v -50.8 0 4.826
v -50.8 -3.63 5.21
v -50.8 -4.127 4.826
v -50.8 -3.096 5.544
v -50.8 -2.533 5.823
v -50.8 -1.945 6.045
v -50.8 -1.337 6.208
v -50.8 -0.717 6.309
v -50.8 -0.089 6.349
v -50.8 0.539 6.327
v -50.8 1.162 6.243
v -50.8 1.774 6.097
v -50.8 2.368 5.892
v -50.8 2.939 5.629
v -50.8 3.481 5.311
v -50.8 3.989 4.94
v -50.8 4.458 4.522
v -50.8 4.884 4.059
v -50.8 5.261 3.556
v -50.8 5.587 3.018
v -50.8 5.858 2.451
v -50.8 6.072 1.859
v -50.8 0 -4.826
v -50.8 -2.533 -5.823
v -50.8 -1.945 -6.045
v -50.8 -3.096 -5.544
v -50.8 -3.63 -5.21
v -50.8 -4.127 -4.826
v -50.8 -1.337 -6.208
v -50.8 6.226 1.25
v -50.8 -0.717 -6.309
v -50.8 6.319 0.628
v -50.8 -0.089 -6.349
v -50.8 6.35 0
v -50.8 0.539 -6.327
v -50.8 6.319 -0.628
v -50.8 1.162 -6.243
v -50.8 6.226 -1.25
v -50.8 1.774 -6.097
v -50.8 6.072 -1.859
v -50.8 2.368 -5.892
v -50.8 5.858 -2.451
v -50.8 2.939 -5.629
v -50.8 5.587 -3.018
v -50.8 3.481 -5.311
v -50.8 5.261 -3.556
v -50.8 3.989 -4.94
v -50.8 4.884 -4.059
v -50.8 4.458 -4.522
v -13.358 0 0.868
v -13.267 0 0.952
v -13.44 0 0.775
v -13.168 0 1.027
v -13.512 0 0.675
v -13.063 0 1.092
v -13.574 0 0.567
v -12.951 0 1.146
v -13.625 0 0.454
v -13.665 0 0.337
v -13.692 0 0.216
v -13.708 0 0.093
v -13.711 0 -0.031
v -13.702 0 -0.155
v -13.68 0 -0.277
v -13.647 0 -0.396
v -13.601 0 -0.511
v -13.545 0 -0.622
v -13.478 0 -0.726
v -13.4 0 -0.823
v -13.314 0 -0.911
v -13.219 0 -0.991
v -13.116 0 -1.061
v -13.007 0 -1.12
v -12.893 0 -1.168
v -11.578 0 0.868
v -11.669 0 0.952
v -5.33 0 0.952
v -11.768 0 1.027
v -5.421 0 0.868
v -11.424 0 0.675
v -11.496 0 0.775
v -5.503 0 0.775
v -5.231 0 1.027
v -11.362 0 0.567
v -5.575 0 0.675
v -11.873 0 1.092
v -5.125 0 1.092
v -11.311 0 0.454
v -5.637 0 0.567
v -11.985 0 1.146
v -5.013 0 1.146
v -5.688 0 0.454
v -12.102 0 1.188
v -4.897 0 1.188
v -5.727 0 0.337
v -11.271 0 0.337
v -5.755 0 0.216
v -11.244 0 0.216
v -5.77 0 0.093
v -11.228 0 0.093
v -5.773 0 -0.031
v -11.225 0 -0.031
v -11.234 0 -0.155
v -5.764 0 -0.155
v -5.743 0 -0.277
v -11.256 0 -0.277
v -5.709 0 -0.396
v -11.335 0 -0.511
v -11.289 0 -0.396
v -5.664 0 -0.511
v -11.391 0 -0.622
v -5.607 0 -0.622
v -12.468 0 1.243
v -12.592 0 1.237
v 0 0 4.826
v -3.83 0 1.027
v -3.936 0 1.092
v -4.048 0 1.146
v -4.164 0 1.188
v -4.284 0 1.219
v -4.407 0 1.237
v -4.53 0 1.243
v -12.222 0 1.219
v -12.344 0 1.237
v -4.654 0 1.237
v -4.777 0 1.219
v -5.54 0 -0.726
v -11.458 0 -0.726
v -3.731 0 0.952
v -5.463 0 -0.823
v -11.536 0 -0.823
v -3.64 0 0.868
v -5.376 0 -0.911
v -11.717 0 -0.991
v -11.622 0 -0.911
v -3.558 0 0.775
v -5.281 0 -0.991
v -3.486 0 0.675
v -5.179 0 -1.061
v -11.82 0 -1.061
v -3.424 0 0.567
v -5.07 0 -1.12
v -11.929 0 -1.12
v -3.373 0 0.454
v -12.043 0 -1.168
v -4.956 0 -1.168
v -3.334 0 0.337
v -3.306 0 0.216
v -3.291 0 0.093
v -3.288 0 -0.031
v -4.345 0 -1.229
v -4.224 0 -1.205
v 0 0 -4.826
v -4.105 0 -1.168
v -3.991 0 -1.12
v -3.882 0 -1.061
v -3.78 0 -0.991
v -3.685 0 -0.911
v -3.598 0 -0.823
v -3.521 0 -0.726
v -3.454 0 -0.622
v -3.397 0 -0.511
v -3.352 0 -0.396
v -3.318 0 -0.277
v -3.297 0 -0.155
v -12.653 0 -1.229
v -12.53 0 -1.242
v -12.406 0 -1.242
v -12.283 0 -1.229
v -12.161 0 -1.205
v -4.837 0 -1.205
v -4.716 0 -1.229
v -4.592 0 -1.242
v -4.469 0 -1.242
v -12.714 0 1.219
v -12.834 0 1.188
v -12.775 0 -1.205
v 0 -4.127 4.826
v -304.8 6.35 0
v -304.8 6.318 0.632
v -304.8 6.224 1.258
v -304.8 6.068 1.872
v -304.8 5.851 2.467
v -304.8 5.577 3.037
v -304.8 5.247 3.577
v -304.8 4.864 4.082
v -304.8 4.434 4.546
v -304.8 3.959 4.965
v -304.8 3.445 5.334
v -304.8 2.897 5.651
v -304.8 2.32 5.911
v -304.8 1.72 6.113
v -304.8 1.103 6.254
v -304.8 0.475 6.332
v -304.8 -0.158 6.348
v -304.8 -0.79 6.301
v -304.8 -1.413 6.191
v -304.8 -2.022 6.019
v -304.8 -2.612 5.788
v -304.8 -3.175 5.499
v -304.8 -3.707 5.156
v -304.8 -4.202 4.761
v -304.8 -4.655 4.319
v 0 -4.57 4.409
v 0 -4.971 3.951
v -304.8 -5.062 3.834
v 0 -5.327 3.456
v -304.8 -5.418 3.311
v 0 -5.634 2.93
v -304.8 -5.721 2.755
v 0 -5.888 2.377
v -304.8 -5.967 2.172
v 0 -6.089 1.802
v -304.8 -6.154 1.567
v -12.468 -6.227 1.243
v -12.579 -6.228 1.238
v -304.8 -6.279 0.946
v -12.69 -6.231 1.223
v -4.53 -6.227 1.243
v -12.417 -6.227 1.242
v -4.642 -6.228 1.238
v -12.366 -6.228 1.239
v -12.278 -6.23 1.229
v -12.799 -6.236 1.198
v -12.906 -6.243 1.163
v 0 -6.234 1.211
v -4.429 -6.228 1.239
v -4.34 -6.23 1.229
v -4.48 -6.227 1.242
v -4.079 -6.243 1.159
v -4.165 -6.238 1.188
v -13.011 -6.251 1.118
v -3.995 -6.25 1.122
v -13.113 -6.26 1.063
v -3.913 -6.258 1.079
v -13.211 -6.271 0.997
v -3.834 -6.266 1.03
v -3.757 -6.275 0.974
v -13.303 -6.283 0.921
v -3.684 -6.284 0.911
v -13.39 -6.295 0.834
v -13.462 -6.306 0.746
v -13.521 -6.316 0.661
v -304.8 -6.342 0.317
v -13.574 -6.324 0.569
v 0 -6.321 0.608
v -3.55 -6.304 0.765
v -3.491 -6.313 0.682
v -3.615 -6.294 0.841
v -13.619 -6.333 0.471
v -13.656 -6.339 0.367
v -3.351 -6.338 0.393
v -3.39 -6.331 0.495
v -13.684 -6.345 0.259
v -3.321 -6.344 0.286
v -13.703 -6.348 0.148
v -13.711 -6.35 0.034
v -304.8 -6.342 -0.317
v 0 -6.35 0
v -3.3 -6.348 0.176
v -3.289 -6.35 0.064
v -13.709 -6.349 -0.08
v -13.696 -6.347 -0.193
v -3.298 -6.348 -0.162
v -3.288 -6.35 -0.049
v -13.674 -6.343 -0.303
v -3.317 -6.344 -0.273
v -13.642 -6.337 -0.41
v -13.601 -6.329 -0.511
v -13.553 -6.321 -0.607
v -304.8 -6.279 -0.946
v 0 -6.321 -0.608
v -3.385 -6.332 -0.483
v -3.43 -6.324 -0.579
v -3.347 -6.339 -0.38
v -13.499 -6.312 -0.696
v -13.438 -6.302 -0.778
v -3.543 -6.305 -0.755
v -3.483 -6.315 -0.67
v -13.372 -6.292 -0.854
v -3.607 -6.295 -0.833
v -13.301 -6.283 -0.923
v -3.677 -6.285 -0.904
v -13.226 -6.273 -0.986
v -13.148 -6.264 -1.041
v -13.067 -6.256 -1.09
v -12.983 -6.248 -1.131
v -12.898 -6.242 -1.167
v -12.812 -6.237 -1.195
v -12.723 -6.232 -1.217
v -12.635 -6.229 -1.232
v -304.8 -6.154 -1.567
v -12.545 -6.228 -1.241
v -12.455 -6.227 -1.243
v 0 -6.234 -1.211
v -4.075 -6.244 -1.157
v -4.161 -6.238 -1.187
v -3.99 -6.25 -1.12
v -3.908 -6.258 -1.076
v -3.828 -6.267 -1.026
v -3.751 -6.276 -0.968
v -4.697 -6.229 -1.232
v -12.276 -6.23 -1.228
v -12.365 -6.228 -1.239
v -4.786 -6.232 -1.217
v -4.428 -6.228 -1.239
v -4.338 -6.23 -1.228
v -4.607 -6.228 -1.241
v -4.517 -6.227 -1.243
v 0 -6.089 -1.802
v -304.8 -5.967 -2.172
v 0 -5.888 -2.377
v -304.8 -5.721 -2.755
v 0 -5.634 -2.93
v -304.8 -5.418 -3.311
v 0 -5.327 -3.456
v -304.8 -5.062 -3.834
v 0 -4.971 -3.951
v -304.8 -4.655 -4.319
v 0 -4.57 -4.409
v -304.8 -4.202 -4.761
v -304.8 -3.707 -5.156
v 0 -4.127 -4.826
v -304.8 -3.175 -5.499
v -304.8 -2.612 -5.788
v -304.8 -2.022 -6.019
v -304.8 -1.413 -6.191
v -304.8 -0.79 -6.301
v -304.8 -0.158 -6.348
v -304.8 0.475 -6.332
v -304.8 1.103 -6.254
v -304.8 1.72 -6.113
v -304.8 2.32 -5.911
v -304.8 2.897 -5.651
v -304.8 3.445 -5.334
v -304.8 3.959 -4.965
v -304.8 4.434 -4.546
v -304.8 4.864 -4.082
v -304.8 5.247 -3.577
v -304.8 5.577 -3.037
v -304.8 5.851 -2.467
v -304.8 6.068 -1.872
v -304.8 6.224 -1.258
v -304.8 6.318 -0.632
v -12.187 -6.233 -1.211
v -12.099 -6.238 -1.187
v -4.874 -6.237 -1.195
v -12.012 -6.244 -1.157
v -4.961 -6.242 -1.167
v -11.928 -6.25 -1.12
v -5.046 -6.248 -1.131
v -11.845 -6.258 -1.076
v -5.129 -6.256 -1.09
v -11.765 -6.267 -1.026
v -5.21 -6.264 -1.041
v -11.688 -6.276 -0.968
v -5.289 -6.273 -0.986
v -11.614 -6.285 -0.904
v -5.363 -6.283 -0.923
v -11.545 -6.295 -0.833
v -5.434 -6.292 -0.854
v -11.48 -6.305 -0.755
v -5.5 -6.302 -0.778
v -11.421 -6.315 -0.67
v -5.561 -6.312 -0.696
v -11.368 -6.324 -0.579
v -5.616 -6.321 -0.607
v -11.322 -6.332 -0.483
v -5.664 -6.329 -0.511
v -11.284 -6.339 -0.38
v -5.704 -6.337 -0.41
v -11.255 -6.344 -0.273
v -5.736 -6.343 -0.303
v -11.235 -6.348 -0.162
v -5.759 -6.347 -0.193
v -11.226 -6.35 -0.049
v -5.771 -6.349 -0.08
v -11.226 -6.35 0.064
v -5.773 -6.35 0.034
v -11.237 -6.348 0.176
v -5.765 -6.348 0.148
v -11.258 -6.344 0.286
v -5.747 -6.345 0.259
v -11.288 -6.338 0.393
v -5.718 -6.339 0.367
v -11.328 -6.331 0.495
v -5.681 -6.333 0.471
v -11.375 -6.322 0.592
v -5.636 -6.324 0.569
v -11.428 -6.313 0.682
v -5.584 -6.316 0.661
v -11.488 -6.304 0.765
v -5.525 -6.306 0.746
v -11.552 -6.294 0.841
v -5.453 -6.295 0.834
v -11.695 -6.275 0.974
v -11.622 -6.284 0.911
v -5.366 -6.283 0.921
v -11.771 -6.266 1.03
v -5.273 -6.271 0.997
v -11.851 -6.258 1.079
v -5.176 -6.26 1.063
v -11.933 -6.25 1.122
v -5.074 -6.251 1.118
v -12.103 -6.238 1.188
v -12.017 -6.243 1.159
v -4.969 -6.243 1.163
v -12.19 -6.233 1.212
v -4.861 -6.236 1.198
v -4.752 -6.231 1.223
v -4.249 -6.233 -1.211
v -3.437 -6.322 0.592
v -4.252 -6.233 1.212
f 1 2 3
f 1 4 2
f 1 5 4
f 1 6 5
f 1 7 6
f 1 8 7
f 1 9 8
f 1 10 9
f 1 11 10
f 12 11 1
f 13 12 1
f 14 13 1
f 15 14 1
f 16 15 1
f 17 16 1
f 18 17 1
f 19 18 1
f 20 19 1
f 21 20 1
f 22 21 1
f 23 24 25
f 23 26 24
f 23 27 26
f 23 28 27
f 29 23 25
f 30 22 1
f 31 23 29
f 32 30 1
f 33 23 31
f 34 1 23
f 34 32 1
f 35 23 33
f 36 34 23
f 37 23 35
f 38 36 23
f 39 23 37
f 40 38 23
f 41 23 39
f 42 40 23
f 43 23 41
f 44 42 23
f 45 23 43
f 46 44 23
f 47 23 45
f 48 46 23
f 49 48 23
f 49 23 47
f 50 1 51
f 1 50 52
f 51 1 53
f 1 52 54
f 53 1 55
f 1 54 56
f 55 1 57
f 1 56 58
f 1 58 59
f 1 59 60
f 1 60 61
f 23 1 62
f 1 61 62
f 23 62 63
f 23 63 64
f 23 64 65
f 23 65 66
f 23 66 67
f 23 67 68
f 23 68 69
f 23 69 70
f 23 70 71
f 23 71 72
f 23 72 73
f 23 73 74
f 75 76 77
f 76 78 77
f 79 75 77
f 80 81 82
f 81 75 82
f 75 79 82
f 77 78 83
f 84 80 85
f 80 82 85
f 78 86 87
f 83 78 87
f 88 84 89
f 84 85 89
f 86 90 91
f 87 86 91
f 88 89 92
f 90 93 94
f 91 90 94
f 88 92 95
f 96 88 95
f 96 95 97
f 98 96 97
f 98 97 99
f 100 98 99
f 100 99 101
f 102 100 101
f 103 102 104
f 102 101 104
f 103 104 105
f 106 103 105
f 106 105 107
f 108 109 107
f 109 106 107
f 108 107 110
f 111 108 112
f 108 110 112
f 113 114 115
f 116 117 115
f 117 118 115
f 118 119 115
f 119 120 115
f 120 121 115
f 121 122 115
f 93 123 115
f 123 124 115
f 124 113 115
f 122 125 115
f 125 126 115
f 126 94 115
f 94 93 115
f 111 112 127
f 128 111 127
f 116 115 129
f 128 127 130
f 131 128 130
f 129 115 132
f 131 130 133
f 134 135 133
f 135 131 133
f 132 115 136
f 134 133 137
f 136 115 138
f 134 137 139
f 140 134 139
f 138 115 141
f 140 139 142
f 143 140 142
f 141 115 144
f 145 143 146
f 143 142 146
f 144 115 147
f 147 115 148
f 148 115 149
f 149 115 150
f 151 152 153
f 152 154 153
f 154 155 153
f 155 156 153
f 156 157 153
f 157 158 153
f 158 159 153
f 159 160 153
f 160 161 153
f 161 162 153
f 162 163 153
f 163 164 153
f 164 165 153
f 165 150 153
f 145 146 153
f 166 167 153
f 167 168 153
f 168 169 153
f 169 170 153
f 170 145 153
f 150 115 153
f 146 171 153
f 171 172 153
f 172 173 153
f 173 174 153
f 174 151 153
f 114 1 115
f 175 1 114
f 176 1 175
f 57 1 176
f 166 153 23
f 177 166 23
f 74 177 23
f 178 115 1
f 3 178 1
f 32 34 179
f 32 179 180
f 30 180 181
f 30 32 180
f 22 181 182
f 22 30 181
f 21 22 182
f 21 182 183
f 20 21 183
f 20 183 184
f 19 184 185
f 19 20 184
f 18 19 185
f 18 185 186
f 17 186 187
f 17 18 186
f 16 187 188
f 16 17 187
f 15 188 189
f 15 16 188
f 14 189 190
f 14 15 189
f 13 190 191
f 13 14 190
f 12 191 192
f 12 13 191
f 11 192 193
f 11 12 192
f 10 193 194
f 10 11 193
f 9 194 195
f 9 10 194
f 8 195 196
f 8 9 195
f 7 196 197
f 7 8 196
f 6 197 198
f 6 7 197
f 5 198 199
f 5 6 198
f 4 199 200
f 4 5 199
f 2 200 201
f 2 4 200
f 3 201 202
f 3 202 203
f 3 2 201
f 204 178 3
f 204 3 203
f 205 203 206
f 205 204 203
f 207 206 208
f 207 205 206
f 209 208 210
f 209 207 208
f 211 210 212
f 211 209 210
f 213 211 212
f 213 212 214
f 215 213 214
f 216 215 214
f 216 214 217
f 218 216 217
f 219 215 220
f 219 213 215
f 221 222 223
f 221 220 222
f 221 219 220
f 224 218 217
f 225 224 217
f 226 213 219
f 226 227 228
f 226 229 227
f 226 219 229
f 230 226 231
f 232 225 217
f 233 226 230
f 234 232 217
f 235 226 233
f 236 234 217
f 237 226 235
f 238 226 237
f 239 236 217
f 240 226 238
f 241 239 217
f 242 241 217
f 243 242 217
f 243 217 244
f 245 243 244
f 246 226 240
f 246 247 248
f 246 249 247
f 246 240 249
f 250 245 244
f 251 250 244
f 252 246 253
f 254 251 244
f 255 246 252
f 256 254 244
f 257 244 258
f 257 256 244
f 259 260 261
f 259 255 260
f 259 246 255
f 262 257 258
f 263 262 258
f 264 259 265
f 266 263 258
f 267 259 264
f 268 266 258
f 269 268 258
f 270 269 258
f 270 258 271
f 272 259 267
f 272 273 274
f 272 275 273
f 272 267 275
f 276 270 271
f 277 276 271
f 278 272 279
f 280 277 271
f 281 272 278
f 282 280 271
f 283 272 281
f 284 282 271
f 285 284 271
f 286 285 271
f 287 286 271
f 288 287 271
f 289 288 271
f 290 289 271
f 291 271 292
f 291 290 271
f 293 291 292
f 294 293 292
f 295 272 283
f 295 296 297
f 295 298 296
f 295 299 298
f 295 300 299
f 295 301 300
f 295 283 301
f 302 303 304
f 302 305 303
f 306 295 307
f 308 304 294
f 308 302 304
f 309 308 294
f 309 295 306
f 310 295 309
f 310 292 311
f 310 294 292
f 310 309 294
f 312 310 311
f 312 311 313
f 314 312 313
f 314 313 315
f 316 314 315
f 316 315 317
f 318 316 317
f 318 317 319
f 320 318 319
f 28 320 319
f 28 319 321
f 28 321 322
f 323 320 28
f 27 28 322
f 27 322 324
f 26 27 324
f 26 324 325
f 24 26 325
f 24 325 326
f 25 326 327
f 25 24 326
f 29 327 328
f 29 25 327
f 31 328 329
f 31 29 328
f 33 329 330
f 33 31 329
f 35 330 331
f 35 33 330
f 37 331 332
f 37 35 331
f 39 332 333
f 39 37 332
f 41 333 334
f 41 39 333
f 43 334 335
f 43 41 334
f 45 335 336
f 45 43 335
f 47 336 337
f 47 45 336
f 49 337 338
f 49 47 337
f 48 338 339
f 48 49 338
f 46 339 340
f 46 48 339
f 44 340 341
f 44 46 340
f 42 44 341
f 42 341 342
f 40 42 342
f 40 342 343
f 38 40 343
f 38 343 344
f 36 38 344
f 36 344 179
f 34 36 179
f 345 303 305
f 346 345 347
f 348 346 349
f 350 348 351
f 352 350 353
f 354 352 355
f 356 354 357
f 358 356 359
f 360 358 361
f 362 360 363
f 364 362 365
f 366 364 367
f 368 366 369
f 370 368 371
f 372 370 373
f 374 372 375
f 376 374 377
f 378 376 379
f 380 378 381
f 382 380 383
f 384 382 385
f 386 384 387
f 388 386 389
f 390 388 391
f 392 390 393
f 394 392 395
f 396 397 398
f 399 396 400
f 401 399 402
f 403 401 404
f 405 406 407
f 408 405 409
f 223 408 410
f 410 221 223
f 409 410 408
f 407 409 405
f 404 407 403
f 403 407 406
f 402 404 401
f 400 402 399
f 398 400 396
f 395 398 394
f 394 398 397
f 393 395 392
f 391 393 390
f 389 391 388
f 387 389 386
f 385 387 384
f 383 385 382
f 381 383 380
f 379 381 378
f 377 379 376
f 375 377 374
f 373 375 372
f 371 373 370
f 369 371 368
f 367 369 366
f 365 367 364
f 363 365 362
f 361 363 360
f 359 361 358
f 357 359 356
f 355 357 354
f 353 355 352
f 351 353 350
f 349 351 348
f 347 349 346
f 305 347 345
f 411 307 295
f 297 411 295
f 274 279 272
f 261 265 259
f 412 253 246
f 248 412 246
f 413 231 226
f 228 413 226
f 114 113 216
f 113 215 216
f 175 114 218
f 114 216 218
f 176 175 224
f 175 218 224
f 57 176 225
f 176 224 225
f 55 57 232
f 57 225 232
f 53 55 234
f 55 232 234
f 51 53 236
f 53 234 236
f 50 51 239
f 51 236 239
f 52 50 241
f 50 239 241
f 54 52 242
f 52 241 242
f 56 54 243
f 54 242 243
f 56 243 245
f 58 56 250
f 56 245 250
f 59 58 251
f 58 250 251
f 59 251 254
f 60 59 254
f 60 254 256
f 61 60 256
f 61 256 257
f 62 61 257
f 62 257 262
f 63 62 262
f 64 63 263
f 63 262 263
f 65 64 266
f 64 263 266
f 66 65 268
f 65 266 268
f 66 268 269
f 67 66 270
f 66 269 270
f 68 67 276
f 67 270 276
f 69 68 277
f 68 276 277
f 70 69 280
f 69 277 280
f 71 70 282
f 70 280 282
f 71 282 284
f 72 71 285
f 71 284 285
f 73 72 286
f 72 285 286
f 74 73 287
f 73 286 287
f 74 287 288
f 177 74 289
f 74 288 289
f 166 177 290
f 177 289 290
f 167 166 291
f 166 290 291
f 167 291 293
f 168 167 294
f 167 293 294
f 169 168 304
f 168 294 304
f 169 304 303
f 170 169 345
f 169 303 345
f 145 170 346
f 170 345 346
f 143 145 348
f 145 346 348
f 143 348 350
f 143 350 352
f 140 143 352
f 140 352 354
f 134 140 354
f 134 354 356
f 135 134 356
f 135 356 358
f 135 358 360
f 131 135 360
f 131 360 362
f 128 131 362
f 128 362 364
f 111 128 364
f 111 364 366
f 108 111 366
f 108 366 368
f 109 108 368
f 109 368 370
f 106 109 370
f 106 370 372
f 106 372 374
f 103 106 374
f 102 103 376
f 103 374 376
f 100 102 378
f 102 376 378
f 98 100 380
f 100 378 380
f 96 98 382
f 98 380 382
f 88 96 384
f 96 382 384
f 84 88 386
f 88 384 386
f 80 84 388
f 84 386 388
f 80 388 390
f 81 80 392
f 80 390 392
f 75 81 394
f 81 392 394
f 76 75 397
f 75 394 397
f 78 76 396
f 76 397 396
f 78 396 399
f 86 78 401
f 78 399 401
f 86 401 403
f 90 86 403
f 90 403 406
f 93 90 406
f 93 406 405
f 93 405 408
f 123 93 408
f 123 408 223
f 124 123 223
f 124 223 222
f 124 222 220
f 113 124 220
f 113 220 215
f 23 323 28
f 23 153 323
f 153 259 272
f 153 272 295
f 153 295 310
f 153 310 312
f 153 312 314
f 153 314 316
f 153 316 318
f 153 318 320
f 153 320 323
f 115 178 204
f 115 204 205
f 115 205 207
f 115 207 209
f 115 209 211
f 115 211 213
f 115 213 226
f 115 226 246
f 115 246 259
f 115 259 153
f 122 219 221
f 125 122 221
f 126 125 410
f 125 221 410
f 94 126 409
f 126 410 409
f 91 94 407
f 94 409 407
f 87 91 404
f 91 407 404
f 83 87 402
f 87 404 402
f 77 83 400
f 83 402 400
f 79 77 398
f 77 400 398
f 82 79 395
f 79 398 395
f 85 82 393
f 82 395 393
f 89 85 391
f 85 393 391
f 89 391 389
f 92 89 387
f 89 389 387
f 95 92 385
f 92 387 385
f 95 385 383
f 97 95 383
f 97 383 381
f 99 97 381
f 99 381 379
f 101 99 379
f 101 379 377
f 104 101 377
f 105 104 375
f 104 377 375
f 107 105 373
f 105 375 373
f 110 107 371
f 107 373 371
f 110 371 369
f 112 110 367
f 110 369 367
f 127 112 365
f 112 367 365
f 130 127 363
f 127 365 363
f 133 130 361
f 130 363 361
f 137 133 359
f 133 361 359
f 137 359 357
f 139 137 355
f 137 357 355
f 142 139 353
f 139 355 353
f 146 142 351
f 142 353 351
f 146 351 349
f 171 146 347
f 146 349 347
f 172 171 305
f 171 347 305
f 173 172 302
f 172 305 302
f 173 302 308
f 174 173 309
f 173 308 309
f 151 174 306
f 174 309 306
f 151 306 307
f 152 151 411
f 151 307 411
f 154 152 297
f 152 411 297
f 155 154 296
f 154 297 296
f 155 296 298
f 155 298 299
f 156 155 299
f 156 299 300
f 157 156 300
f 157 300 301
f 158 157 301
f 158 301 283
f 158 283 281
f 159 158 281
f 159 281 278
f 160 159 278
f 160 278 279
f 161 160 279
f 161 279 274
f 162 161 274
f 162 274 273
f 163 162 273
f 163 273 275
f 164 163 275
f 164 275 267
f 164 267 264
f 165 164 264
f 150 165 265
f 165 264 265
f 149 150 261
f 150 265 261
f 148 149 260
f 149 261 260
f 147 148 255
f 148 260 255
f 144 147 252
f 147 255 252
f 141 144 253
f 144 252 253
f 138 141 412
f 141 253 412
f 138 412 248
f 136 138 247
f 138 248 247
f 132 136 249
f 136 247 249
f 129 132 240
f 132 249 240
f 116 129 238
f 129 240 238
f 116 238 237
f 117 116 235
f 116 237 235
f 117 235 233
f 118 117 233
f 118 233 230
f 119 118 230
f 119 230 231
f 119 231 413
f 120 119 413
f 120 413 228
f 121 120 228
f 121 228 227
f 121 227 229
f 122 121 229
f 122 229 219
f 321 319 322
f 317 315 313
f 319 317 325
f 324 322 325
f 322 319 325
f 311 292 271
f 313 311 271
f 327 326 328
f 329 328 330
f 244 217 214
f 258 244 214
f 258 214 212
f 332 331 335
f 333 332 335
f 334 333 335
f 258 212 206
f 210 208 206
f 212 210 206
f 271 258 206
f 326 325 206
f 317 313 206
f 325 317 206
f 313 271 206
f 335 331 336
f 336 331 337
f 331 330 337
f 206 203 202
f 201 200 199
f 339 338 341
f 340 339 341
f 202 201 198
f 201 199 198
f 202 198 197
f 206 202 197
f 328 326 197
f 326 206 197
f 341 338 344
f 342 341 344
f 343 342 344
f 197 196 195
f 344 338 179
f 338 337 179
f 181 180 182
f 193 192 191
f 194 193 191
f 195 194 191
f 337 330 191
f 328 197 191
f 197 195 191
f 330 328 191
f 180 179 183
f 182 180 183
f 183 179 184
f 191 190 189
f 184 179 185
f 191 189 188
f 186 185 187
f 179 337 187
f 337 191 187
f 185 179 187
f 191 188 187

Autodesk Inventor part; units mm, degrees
ref_plane "YZ Plane" through (0, 0, 0) normal (1, 0, 0) x (0, 1, 0)
ref_plane "XZ Plane" through (0, 0, 0) normal (0, 1, 0) x (-1, 0, 0)
ref_plane "XY Plane" through (0, 0, 0) normal (0, 0, 1) x (1, 0, 0)
sketch "Sketch1" plane through (0, 0, 0) normal (1, 0, 0) x (0, 1, 0)
  circle A0 centre (0, 0) radius 6.35
  dimension "d61" = 12.7
extrude "Extrusion1" add sketch "Sketch1" against normal blind 304.8
sketch "Sketch2" plane through (0, 0, 0) normal (1, 0, 0) x (0, 0, -1)
  arc A0 (6.35, 0) -> (-6.35, 0) centre (0, 0) ccw
  circle A1 centre (0, 0) radius 6.35 projected
  line L0 (-6.35, 0) -> (6.35, 0)
extrude "Extrusion2" cut sketch "Sketch2" against normal blind 50.8 contours L0 A0
sketch "Sketch3" plane through (0, 0, 6.35) normal (0, 1, 0) x (1, 0, 0)
  circle A0 centre (-12.468, 6.35) radius 1.5875
  circle A1 centre (-4.5305, 6.35) radius 1.5875
  line L0 (0, 6.35) -> (-2.943, 6.35)
  line L1 (0, 12.7) -> (0, 0) projected
  line L2 (-2.943, 6.35) -> (-12.468, 6.35) construction
  dimension "d50" = 3.175
  dimension "d48" = 7.9375
  dimension "d49" = 3.175
  dimension "d60" = 2.943
sketch "Sketch5" plane through (0, 0, 6.35) normal (0, 1, 0) x (1, 0, 0)
  line L0 (0, 6.35) -> (0, 11.176)
  line L1 (0, 12.7) -> (0, 0) projected
  line L2 (0, 11.176) -> (-50.8, 11.176)
  line L3 (-50.8, 12.7) -> (-50.8, 0) projected
  line L4 (0, 6.35) -> (0, 1.524)
  line L5 (0, 1.524) -> (-50.8, 1.524)
  line L6 (-50.8, 1.524) -> (-50.8, -4.826)
  line L7 (-50.8, -4.826) -> (10.9985, -4.826)
  line L8 (10.9985, -4.826) -> (0, 1.524)
  line L9 (-50.8, 11.176) -> (-50.8, 17.526)
  line L10 (-50.8, 17.526) -> (10.9985, 17.526)
  line L11 (0, 11.176) -> (10.9985, 17.526)
  line L12 (-50.8, 12.7) -> (0, 12.7) projected
  dimension "d20" = 4.826
  dimension "d21" = 4.826
  dimension "d62" = 4.826
extrude "Extrusion3" cut sketch "Sketch5" against normal blind 25.4 contours L2 L3 L12 L1 | L1 L12 L9 L10 L11 | L8 L7 L6 L3 L5
hole "Hole3" at (-12.468, 0, 0) at (-4.5305, 0, 0) direction (0, -1, 0) diameter 2.4867 end through all thread size "5-40 UNC" class "2B" standard "ANSI Unified Screw Threads"
equation "\"d62\" = d20"
properties part number "rat_headbarStraight" material "Stainless Steel"
